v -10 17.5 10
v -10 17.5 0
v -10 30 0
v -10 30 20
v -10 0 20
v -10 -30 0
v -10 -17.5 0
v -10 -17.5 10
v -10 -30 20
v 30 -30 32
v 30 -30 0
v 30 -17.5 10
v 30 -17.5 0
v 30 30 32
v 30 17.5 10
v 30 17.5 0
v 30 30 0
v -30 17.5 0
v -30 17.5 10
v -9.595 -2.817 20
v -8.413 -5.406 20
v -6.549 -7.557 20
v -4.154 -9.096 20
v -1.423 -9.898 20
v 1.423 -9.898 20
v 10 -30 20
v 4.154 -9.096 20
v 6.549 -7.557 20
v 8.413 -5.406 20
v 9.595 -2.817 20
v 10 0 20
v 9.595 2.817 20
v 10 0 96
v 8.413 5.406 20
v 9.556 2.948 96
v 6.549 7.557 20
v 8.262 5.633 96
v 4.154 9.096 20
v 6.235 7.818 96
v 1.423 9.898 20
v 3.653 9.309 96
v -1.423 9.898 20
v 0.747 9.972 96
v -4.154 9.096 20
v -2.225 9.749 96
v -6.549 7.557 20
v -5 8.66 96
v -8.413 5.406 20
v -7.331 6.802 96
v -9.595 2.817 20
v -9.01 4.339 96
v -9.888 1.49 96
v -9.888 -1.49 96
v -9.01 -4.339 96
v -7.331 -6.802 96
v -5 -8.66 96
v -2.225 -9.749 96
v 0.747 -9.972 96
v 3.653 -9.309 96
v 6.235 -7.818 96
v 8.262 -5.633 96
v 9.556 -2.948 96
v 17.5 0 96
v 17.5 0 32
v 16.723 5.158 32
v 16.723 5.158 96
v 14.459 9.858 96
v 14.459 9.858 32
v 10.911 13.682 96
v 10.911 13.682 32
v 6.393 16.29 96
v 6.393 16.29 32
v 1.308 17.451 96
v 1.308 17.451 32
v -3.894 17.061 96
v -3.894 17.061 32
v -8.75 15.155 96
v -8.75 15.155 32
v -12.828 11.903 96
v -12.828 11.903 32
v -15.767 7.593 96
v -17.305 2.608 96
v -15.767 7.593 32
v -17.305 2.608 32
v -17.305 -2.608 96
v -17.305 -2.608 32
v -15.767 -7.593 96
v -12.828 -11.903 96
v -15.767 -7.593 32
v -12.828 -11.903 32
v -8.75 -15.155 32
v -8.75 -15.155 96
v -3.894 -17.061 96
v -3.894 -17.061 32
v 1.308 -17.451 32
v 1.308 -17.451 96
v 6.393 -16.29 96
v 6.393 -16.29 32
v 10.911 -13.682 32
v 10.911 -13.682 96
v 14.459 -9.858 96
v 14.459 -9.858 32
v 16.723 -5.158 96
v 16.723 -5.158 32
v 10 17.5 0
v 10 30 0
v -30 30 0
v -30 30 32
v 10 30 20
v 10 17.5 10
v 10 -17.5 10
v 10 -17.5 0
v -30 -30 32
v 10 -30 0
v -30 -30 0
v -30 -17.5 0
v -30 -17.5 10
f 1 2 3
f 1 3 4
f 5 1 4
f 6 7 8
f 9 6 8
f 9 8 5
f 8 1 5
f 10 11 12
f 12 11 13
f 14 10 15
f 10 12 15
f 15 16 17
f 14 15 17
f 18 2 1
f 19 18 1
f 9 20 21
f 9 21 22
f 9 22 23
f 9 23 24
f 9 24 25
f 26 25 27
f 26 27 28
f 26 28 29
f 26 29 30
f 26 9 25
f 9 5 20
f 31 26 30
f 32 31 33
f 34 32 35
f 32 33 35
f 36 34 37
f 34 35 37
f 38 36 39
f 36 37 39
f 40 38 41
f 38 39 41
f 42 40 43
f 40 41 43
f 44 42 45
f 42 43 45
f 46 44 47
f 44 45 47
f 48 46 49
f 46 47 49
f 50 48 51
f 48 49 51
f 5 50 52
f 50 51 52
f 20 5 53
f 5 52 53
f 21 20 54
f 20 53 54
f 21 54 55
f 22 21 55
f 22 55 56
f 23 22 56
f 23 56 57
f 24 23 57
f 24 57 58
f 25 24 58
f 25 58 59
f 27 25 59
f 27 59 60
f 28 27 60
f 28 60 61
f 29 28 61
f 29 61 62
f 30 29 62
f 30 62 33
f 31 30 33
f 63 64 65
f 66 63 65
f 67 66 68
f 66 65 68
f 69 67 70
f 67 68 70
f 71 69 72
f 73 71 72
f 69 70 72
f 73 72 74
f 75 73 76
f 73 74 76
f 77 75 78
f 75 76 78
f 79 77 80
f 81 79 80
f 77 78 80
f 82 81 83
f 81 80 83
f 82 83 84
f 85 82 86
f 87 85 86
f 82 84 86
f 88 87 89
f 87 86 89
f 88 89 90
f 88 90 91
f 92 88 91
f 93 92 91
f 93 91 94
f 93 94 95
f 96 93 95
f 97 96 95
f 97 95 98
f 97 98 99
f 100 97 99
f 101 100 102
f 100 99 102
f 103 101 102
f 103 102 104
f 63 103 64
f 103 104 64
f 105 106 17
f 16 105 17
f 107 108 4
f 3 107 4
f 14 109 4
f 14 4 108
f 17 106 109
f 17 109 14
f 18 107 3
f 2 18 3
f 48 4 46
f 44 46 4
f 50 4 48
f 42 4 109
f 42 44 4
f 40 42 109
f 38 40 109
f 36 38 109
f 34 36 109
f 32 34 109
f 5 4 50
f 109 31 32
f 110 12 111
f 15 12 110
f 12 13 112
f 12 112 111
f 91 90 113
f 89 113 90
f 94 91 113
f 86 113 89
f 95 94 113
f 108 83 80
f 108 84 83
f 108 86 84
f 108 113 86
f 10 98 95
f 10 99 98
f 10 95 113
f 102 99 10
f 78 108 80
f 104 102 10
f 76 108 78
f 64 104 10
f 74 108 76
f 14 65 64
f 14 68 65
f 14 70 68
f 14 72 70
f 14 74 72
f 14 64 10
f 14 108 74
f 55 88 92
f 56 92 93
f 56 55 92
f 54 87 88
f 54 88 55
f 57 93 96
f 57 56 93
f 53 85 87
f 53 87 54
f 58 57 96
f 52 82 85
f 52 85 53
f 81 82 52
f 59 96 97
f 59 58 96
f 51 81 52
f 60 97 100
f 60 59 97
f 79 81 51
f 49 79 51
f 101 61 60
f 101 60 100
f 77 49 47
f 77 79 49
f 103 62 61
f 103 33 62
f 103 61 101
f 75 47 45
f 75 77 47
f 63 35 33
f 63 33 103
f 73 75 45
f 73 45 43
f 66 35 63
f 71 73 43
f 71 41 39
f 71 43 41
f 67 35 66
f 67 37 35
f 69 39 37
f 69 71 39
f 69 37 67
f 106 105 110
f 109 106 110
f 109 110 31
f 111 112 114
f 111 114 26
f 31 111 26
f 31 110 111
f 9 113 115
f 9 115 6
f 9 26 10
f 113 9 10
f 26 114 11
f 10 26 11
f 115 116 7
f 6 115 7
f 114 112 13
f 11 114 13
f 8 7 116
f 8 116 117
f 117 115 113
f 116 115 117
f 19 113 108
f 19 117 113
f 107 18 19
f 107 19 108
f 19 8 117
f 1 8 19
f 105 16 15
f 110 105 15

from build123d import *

# Parameters (mm, degrees)
F0_W     = 60
F0_H     = 60
F1_DEPTH = 32
F2_R     = 17.5
F3_DEPTH = 64
F4_W     = 20
F4_H     = 20
F5_DEPTH = 60
F6_W     = 35
F6_H     = 10
F7_DEPTH = 60
F8_R     = 10
F9_DEPTH = 96


with BuildPart() as f1:
    # F0 (on Top) → F1 (new body)
    with BuildSketch(Plane.XY):
        Rectangle(F0_W, F0_H)
    extrude(amount=F1_DEPTH)

    # F2 (on face) → F3 (join)
    with BuildSketch(Plane.XY.offset(32)):
        Circle(F2_R)
    extrude(amount=F3_DEPTH)

    # F4 (on face) → F5 (cut)
    with BuildSketch(Plane.XZ.offset(30)):
        with Locations((0, 10)):
            Rectangle(F4_W, F4_H)
    extrude(amount=-F5_DEPTH, mode=Mode.SUBTRACT)

    # F6 (on face) → F7 (cut)
    with BuildSketch(Plane.YZ.offset(30)):
        with Locations((0, 5)):
            Rectangle(F6_W, F6_H)
    extrude(amount=-F7_DEPTH, mode=Mode.SUBTRACT)

    # F8 (on face) → F9 (cut)
    with BuildSketch(Plane.XY.offset(96)):
        Circle(F8_R)
    extrude(amount=-F9_DEPTH, mode=Mode.SUBTRACT)


solid = f1.part
